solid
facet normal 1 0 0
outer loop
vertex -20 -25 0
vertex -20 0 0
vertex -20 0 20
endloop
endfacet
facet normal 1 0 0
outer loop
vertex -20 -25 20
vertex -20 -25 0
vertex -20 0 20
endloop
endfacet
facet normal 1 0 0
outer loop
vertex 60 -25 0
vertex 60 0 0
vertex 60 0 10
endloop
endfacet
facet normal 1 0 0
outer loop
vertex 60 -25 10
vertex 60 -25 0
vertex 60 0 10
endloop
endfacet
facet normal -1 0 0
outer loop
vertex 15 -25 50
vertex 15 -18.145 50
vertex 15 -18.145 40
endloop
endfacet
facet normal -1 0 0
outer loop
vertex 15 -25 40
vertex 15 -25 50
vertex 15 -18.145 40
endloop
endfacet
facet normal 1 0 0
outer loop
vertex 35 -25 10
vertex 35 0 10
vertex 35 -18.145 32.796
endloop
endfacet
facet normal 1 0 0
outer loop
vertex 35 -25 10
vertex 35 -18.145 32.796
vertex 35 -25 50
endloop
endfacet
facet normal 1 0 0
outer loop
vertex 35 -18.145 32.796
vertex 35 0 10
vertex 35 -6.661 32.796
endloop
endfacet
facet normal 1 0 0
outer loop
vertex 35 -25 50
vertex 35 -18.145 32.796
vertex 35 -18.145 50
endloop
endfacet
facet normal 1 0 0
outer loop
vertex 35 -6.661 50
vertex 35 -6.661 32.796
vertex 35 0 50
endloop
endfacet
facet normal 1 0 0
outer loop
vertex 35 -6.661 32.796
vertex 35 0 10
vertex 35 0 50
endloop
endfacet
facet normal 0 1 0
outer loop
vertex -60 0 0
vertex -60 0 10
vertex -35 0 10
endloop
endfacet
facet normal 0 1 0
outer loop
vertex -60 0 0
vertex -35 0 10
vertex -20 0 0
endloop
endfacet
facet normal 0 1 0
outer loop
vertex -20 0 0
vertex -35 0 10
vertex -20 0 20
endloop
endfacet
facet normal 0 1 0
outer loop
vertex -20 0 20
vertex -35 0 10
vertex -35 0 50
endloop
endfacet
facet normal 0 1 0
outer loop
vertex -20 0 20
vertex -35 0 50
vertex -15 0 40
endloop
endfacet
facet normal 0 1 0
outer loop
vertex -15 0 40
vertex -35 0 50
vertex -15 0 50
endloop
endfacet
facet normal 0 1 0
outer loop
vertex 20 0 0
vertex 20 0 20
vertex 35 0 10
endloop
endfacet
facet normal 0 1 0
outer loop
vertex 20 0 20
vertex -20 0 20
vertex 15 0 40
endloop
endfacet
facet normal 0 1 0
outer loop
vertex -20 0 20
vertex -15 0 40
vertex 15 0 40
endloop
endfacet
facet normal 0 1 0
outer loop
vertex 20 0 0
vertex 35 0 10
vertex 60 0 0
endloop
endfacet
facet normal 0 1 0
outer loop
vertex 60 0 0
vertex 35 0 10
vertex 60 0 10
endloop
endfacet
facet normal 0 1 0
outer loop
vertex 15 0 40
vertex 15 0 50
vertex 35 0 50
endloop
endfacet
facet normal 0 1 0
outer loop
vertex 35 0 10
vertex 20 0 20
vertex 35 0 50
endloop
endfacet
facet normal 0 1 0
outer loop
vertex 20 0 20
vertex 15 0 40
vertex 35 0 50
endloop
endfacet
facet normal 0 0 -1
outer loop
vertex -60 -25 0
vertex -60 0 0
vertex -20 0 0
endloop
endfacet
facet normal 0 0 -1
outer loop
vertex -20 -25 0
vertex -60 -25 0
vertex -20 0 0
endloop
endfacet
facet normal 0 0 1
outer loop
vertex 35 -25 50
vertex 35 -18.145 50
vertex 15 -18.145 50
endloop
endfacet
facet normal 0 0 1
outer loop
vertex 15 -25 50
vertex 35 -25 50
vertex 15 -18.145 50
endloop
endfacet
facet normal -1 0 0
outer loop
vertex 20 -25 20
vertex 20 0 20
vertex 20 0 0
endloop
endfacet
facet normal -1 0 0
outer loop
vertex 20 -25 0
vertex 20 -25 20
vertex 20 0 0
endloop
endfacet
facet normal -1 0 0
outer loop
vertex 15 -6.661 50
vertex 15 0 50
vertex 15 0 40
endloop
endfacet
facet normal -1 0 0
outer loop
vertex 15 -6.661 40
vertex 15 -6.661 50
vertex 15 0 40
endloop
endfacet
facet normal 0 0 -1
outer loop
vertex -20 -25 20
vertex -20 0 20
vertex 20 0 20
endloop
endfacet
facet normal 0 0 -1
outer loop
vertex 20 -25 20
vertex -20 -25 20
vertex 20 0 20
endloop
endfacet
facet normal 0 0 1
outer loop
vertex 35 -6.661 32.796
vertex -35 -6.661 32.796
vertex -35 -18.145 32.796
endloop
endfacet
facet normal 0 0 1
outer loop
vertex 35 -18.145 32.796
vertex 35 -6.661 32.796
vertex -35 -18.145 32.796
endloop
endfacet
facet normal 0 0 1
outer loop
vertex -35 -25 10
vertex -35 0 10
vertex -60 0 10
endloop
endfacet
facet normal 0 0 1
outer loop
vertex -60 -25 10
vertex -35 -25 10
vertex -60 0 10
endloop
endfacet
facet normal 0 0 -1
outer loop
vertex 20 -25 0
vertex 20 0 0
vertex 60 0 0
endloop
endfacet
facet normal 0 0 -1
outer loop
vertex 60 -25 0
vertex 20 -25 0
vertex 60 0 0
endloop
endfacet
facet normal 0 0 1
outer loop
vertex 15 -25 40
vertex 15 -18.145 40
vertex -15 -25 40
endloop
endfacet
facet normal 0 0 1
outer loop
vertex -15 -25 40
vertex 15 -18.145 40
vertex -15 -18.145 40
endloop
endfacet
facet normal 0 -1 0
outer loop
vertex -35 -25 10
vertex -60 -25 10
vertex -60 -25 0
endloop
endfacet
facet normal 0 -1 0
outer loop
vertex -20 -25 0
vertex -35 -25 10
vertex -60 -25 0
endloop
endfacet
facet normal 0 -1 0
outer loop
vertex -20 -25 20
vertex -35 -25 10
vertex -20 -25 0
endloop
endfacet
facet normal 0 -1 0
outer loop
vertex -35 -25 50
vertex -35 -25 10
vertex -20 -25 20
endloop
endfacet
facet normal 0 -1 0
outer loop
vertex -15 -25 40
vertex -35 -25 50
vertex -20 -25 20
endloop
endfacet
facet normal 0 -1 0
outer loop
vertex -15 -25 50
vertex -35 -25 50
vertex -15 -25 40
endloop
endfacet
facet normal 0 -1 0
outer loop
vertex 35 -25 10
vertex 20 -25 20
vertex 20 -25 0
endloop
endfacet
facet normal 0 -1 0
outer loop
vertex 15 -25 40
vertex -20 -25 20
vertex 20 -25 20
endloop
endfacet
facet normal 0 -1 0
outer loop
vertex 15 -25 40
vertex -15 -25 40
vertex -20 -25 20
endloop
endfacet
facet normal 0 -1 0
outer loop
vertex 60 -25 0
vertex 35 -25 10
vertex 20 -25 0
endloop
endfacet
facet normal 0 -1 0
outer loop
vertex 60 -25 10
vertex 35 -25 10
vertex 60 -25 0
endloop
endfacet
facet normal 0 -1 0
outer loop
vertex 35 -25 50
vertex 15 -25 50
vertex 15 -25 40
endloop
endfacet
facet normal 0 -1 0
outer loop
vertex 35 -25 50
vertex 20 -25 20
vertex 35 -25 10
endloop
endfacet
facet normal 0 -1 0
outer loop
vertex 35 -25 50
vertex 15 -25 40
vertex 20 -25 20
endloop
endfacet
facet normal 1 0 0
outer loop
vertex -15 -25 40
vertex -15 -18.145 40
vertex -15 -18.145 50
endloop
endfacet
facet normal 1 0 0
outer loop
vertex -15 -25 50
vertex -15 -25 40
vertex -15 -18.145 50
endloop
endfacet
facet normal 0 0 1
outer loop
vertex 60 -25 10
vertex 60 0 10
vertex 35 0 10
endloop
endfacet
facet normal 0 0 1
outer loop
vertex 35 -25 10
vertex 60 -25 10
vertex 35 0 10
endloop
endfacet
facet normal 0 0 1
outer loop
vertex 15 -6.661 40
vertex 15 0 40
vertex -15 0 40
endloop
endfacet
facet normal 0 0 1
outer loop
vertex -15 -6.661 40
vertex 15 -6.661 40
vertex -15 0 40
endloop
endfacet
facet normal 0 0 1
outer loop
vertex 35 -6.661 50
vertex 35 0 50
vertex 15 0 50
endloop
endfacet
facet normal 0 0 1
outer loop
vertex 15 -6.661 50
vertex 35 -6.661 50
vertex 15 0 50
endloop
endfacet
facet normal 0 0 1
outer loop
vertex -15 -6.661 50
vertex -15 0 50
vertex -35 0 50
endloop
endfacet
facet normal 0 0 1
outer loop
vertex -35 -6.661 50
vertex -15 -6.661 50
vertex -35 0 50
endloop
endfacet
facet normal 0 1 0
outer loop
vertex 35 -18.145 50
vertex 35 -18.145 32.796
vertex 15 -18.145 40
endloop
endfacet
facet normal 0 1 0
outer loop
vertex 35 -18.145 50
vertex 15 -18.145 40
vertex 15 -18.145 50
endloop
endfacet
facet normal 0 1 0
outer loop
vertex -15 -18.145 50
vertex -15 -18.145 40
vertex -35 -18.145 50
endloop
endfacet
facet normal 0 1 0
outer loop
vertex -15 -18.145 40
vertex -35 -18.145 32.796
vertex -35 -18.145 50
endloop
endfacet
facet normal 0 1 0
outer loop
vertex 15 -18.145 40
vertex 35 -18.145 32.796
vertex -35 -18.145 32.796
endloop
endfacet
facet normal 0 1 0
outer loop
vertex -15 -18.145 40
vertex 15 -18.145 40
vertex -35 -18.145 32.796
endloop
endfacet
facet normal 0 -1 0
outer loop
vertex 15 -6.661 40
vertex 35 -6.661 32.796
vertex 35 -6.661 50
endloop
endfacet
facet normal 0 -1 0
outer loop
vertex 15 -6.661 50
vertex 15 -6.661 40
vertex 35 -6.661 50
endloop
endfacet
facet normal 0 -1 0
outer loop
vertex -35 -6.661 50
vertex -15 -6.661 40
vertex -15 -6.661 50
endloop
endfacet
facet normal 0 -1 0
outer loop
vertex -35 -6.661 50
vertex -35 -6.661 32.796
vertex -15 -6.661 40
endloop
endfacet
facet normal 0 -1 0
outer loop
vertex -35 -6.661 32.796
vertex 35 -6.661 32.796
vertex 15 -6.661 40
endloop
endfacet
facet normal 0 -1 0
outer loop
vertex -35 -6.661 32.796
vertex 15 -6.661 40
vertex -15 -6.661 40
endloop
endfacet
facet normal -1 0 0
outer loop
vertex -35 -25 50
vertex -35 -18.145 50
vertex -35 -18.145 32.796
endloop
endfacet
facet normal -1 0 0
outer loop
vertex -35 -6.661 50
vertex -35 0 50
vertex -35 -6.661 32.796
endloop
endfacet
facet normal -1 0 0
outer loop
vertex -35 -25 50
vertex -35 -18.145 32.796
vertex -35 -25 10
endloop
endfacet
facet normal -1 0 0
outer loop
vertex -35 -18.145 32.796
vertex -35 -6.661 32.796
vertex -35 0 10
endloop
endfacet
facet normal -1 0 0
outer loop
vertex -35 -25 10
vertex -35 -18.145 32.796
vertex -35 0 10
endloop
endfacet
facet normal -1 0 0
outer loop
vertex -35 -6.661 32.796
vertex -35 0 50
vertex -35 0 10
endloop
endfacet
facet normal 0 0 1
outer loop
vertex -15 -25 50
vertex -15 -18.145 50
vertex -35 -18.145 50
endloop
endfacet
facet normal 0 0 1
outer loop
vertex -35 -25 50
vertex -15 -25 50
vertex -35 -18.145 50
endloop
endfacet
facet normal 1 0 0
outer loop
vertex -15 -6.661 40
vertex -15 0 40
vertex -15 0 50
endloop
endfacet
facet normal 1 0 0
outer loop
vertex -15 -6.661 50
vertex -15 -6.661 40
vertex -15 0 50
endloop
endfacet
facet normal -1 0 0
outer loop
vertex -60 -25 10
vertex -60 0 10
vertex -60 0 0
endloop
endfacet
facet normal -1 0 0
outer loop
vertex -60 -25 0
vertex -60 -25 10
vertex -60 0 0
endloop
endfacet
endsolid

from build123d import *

# Parameters (mm, degrees)
F1_DEPTH = 25
F2_W     = 11.483927
F2_H     = 17.204142
F3_DEPTH = 76.6


with BuildPart() as f1:
    # F0 (on Front) → F1 (new body)
    with BuildSketch(Plane.XZ):
        Polygon((-60, 10), (-60, 0), (-20, 0), (-20, 20), (20, 20), (20, 0), (60, 0), (60, 10), (35, 10), (35, 50), (15, 50), (15, 40), (-15, 40), (-15, 50), (-35, 50), (-35, 10), align=None)
    extrude(amount=F1_DEPTH)

    # F2 (on face) → F3 (cut)
    with BuildSketch(Plane(origin=(-35, 0, 0), x_dir=(0, -1, 0), z_dir=(-1, 0, 0))):
        with Locations((12.402802, 41.397929)):
            Rectangle(F2_W, F2_H)
    extrude(amount=-F3_DEPTH, mode=Mode.SUBTRACT)


solid = f1.part
